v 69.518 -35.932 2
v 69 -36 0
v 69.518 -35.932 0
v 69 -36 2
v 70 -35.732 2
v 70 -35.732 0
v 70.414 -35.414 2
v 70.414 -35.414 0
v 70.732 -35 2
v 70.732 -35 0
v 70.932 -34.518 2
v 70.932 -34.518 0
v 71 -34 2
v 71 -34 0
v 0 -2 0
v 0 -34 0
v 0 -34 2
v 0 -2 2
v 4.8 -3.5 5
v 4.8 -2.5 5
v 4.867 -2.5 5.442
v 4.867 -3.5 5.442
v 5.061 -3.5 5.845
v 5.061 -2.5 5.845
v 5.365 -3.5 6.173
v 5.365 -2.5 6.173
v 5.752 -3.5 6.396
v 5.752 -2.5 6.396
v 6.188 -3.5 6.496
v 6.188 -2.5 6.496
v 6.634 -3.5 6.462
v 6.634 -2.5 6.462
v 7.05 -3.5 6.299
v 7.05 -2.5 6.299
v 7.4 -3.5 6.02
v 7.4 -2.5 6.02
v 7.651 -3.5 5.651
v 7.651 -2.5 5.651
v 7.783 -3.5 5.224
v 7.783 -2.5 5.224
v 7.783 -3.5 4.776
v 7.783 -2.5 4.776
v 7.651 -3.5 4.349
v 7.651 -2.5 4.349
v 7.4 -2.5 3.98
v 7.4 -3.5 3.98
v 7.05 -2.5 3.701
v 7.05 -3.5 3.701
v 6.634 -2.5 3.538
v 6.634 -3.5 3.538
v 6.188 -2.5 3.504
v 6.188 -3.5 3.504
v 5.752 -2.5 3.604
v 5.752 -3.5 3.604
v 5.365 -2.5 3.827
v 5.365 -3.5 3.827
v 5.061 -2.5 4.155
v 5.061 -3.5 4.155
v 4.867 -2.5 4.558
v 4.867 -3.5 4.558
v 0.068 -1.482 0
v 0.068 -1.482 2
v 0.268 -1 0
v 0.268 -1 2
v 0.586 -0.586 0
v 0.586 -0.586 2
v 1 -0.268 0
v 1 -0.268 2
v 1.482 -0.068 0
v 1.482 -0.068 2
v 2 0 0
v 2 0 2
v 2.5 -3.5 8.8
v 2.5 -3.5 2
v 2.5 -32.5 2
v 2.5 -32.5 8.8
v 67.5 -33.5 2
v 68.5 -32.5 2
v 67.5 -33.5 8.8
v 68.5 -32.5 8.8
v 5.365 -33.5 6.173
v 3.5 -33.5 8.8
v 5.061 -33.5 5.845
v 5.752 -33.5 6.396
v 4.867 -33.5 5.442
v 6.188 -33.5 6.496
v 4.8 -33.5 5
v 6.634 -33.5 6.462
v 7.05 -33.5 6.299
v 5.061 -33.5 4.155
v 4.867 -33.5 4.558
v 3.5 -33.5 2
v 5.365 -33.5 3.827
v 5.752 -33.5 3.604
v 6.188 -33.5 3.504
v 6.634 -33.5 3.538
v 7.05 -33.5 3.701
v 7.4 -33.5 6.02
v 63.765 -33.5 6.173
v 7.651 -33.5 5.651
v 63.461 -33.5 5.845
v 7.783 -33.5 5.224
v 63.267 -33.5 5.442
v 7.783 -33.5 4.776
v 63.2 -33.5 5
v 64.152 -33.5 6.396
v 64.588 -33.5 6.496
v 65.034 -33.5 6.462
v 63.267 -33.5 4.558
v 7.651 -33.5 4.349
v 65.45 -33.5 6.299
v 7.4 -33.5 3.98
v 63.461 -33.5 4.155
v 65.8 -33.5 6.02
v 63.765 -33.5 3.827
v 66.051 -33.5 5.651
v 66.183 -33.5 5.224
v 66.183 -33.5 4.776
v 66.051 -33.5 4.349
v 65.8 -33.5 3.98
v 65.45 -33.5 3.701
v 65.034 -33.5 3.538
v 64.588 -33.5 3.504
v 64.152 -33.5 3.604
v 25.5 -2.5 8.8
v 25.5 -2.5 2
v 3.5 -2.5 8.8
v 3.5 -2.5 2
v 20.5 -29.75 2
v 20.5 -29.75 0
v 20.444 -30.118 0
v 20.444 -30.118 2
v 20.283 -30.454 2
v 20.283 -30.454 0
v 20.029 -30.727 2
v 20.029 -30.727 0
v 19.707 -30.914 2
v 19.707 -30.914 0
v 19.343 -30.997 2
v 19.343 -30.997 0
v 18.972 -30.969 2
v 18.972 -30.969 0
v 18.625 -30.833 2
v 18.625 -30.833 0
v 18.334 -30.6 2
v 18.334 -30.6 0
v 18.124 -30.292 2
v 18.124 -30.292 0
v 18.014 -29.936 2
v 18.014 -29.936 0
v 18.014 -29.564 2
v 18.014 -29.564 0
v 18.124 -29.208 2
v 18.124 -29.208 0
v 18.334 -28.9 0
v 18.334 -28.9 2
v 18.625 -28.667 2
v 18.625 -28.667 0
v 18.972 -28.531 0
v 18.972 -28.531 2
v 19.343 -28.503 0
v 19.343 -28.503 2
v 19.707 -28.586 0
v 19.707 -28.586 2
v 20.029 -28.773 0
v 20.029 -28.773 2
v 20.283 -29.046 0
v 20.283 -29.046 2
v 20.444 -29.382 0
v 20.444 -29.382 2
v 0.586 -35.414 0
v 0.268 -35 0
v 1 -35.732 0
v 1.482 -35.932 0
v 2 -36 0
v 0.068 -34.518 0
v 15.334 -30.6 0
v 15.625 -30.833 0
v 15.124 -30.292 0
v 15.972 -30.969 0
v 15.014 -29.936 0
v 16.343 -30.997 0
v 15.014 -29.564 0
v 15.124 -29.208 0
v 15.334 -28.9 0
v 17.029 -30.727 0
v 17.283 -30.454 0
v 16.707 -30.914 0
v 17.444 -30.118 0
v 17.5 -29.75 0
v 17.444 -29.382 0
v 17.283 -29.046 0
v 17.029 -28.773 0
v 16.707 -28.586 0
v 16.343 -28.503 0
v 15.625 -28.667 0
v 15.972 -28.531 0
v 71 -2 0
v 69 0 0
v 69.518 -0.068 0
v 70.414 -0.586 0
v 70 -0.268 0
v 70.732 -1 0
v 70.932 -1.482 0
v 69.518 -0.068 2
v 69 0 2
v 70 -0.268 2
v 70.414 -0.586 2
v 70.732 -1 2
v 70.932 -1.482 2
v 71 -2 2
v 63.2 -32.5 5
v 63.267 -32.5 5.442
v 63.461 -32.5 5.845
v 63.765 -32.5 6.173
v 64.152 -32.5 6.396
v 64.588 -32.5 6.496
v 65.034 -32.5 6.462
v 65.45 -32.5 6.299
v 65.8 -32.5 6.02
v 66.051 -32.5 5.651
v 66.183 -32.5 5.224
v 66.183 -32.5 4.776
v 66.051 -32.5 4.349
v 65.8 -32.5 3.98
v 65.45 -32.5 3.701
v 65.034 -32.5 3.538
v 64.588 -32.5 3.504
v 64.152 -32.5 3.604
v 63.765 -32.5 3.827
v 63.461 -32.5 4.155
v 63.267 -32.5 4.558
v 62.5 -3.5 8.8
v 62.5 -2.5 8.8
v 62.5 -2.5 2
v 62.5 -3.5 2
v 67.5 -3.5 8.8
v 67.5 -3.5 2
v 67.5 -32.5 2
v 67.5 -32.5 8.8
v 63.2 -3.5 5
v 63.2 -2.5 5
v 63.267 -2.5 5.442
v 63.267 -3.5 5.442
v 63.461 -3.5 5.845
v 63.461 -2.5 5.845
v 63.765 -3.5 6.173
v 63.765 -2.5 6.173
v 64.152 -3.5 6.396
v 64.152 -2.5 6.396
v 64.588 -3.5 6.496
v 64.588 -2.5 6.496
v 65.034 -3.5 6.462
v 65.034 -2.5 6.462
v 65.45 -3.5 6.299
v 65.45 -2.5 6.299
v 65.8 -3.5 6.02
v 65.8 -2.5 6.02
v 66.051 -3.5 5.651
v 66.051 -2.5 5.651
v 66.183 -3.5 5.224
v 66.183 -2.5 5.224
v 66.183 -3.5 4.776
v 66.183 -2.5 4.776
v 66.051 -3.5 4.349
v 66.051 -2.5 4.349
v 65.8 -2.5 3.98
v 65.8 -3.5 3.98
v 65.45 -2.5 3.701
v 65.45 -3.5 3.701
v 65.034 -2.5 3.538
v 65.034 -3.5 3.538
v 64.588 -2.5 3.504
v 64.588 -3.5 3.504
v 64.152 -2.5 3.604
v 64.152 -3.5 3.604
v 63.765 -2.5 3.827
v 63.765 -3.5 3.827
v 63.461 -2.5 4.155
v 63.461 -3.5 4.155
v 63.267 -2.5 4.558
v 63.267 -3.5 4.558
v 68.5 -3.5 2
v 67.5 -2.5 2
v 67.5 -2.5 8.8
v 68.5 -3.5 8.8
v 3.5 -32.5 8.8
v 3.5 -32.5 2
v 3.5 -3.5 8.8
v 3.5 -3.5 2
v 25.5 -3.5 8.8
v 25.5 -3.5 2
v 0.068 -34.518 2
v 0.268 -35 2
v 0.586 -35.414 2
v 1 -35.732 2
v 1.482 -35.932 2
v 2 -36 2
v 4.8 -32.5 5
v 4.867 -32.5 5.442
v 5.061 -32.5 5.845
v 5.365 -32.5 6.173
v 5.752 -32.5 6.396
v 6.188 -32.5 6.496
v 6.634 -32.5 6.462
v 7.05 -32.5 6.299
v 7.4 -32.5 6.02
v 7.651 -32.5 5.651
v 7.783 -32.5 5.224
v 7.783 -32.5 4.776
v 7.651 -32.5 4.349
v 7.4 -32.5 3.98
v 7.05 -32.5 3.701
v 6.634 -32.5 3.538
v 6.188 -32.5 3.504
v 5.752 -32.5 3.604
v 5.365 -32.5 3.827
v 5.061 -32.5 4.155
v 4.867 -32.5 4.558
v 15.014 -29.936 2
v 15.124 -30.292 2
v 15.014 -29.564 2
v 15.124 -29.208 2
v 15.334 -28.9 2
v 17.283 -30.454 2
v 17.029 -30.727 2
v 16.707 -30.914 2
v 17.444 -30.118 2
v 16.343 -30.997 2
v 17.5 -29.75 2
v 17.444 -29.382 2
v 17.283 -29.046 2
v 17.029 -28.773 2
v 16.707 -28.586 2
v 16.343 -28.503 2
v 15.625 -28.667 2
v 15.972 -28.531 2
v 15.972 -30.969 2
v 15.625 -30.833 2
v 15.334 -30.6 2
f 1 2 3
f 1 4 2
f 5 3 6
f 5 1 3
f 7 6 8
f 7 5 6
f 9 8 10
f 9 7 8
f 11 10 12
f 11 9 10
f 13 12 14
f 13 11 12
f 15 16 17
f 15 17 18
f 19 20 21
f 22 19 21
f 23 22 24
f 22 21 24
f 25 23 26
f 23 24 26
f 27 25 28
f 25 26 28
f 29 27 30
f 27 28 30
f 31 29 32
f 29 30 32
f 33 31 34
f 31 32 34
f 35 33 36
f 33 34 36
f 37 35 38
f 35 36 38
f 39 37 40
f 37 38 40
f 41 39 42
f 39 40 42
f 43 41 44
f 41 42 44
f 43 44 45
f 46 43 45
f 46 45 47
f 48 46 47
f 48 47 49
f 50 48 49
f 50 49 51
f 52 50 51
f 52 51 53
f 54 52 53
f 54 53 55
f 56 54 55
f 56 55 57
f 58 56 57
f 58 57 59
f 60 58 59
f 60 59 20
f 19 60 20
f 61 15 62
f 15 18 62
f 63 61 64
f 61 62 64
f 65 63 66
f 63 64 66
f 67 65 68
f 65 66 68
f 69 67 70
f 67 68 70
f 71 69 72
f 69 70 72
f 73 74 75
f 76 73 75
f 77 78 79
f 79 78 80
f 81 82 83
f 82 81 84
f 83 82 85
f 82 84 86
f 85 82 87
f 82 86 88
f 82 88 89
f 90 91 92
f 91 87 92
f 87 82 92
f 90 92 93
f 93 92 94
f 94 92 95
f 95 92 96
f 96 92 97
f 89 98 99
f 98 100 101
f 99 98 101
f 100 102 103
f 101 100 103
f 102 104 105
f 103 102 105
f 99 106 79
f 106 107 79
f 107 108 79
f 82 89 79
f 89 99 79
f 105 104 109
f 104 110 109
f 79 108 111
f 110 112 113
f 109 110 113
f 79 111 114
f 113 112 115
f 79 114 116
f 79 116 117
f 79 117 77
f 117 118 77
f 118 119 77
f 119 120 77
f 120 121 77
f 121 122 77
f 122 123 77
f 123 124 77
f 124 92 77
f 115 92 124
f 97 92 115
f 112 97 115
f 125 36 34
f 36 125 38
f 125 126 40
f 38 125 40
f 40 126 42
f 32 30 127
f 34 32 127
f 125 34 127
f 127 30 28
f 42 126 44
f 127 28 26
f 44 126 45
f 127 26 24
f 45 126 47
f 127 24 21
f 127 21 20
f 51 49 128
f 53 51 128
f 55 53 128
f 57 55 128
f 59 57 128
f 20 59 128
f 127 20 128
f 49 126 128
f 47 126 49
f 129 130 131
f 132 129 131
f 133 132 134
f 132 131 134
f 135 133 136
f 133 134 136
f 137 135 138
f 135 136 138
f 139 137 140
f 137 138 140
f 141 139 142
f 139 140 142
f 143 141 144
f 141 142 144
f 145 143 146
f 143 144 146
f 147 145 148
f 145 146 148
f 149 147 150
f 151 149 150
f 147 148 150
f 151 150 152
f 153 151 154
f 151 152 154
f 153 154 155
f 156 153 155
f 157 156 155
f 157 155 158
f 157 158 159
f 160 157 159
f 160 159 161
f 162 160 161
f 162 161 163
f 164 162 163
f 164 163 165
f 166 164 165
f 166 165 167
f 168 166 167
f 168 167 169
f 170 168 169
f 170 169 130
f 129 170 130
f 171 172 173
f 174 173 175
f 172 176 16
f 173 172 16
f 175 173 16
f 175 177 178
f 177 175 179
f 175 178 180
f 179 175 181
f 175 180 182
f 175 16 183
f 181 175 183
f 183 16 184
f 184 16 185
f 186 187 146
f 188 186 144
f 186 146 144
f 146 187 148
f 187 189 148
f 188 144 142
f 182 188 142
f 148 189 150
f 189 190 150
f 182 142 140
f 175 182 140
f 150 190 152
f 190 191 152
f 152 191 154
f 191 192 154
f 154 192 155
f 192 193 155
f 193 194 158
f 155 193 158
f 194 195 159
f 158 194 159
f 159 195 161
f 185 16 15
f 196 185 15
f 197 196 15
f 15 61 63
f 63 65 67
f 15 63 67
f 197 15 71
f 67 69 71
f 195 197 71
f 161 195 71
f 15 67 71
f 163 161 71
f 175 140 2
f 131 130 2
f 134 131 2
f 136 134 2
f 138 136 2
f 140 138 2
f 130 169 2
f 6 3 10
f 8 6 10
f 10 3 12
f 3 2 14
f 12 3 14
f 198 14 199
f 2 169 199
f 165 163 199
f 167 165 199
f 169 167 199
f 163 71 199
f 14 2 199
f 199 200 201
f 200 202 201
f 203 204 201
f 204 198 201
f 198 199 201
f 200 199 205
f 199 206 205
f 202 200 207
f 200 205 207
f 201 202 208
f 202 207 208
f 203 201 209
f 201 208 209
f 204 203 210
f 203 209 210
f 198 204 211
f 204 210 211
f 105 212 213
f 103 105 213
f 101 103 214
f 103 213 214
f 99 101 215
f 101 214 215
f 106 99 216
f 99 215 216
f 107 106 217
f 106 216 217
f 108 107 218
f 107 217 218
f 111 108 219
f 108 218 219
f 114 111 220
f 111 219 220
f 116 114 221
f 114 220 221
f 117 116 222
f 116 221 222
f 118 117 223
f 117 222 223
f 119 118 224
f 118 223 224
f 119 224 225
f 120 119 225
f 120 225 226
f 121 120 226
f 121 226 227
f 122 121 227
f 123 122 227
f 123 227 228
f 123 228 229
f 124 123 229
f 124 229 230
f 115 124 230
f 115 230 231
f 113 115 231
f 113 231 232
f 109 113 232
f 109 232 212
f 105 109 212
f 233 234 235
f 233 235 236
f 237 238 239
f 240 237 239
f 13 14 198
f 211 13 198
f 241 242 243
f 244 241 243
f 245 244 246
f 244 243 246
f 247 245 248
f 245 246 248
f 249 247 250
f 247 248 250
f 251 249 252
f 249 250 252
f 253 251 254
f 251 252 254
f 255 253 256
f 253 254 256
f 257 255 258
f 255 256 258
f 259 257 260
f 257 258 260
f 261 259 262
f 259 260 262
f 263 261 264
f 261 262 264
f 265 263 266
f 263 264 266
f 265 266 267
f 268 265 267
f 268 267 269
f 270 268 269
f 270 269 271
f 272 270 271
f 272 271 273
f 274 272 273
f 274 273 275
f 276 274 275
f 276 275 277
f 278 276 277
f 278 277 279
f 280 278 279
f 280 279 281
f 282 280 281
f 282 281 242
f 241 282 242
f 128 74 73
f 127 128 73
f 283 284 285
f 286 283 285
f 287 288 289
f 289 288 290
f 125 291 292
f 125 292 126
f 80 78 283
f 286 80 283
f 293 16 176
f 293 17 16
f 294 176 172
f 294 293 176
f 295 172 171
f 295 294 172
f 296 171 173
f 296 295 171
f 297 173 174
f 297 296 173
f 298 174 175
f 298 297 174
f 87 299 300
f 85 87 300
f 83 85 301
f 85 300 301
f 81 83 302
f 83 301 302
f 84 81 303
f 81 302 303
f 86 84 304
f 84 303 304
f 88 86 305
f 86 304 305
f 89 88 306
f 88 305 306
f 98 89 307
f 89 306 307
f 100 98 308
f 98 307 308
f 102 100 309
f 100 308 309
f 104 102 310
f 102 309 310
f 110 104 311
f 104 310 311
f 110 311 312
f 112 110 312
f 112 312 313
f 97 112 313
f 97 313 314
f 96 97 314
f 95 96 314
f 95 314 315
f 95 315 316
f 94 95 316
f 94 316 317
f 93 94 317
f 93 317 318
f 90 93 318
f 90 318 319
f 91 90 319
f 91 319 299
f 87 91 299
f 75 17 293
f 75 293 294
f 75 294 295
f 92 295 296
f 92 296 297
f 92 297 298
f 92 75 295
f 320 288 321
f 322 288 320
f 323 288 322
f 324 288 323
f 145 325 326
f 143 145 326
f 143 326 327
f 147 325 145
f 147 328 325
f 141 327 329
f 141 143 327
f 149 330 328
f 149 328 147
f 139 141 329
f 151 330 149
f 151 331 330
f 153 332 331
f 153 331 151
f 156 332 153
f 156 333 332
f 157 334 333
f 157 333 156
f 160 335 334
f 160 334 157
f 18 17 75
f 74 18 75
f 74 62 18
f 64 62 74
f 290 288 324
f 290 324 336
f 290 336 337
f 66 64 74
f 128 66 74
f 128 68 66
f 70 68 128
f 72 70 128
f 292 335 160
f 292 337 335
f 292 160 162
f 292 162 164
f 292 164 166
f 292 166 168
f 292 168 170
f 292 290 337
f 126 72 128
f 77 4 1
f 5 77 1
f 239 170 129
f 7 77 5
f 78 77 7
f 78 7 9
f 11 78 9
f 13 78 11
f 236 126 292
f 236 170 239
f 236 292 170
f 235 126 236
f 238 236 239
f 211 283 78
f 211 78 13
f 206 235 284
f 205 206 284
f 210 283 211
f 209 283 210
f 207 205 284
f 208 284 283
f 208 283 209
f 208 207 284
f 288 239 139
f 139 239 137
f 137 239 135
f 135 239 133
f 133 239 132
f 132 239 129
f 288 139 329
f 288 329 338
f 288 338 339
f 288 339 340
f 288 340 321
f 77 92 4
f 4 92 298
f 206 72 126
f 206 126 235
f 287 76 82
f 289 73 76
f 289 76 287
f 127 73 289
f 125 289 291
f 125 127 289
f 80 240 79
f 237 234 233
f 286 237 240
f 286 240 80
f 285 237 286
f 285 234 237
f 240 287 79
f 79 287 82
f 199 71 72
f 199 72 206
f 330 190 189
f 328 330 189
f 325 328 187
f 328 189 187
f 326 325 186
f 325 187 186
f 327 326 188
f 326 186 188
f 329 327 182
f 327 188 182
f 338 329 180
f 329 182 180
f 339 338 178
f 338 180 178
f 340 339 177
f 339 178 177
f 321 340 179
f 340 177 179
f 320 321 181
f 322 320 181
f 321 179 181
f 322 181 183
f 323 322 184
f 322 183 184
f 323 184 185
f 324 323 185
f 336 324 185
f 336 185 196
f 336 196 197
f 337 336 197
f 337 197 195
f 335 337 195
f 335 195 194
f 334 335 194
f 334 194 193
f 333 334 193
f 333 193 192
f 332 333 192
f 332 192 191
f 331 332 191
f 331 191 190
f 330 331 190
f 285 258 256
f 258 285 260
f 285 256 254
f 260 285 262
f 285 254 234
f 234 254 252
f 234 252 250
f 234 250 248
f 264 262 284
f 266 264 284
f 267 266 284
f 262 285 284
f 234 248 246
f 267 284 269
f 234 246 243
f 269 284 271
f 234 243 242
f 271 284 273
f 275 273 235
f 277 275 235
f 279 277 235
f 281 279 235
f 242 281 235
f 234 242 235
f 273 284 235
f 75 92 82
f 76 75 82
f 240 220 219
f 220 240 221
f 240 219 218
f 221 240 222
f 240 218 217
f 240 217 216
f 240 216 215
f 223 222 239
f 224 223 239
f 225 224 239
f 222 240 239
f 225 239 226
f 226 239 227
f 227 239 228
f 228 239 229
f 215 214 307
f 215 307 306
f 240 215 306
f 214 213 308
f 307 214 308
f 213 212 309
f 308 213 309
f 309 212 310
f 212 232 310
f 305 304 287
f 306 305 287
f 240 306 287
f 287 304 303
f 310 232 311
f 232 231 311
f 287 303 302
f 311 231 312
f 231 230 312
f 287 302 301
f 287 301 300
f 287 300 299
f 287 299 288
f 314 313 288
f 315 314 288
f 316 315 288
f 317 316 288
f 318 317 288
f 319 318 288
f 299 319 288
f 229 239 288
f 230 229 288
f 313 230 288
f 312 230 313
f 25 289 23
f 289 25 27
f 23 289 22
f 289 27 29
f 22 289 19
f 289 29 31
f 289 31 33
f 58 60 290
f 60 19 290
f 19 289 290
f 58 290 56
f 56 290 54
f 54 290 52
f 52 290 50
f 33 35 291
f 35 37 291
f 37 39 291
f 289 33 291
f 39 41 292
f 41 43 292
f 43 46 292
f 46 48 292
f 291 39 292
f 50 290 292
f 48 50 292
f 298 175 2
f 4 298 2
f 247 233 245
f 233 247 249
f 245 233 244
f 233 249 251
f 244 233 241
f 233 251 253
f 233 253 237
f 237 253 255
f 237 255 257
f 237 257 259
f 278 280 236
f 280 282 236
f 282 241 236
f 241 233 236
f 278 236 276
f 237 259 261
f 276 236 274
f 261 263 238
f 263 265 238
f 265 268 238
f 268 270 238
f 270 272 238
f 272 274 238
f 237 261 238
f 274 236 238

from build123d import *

# Parameters (mm, degrees)
F0_W     = 71
F0_H     = 36
F1_DEPTH = 2
F3_DEPTH = 6.8
F4_R     = 2
F5_R     = 1.25
F6_DEPTH = 8.801
F7_R     = 1.5
F8_DEPTH = 33.501
F9_SIZE  = 1


with BuildPart() as f1:
    # F0 (on Top) → F1 (new body)
    with BuildSketch(Plane.XY):
        with Locations((35.5, -18)):
            Rectangle(F0_W, F0_H)
    extrude(amount=F1_DEPTH)

    # F2 (on face) → F3 (join)
    with BuildSketch(Plane.XY.offset(2)):
        Polygon((25.5, -2.5), (2.5, -2.5), (2.5, -33.5), (68.5, -33.5), (68.5, -2.5), (62.5, -2.5), (62.5, -3.5), (67.5, -3.5), (67.5, -32.5), (3.5, -32.5), (3.5, -3.5), (25.5, -3.5), align=None)
    extrude(amount=F3_DEPTH)

    # F4
    f4_edges = [f1.edges().sort_by_distance(p)[0] for p in [
        (0, -36, 1),
        (0, 0, 1),
        (71, -36, 1),
        (71, 0, 1),
    ]]
    fillet(f4_edges, radius=F4_R)

    # F5 (on face) → F6 (cut, through all)
    with BuildSketch(Plane(origin=(0, 0, 0), x_dir=(1, 0, 0), z_dir=(0, 0, -1))):
        with Locations((16.25, 29.75)):
            Circle(F5_R)
        with Locations((19.25, 29.75)):
            Circle(F5_R)
    extrude(amount=-F6_DEPTH, mode=Mode.SUBTRACT)

    # F7 (on face) → F8 (cut, through all)
    with BuildSketch(Plane(origin=(0, -2.5, 0), x_dir=(-1, 0, 0), z_dir=(0, 1, 0))):
        with Locations((-64.7, 5)):
            Circle(F7_R)
        with Locations((-6.3, 5)):
            Circle(F7_R)
    extrude(amount=-F8_DEPTH, mode=Mode.SUBTRACT)

    # F9
    f9_edges = [f1.edges().sort_by_distance(p)[0] for p in [
        (2.5, -2.5, 5.4),
        (68.5, -33.5, 5.4),
        (68.5, -2.5, 5.4),
        (2.5, -33.5, 5.4),
    ]]
    chamfer(f9_edges, length=F9_SIZE)


solid = f1.part
